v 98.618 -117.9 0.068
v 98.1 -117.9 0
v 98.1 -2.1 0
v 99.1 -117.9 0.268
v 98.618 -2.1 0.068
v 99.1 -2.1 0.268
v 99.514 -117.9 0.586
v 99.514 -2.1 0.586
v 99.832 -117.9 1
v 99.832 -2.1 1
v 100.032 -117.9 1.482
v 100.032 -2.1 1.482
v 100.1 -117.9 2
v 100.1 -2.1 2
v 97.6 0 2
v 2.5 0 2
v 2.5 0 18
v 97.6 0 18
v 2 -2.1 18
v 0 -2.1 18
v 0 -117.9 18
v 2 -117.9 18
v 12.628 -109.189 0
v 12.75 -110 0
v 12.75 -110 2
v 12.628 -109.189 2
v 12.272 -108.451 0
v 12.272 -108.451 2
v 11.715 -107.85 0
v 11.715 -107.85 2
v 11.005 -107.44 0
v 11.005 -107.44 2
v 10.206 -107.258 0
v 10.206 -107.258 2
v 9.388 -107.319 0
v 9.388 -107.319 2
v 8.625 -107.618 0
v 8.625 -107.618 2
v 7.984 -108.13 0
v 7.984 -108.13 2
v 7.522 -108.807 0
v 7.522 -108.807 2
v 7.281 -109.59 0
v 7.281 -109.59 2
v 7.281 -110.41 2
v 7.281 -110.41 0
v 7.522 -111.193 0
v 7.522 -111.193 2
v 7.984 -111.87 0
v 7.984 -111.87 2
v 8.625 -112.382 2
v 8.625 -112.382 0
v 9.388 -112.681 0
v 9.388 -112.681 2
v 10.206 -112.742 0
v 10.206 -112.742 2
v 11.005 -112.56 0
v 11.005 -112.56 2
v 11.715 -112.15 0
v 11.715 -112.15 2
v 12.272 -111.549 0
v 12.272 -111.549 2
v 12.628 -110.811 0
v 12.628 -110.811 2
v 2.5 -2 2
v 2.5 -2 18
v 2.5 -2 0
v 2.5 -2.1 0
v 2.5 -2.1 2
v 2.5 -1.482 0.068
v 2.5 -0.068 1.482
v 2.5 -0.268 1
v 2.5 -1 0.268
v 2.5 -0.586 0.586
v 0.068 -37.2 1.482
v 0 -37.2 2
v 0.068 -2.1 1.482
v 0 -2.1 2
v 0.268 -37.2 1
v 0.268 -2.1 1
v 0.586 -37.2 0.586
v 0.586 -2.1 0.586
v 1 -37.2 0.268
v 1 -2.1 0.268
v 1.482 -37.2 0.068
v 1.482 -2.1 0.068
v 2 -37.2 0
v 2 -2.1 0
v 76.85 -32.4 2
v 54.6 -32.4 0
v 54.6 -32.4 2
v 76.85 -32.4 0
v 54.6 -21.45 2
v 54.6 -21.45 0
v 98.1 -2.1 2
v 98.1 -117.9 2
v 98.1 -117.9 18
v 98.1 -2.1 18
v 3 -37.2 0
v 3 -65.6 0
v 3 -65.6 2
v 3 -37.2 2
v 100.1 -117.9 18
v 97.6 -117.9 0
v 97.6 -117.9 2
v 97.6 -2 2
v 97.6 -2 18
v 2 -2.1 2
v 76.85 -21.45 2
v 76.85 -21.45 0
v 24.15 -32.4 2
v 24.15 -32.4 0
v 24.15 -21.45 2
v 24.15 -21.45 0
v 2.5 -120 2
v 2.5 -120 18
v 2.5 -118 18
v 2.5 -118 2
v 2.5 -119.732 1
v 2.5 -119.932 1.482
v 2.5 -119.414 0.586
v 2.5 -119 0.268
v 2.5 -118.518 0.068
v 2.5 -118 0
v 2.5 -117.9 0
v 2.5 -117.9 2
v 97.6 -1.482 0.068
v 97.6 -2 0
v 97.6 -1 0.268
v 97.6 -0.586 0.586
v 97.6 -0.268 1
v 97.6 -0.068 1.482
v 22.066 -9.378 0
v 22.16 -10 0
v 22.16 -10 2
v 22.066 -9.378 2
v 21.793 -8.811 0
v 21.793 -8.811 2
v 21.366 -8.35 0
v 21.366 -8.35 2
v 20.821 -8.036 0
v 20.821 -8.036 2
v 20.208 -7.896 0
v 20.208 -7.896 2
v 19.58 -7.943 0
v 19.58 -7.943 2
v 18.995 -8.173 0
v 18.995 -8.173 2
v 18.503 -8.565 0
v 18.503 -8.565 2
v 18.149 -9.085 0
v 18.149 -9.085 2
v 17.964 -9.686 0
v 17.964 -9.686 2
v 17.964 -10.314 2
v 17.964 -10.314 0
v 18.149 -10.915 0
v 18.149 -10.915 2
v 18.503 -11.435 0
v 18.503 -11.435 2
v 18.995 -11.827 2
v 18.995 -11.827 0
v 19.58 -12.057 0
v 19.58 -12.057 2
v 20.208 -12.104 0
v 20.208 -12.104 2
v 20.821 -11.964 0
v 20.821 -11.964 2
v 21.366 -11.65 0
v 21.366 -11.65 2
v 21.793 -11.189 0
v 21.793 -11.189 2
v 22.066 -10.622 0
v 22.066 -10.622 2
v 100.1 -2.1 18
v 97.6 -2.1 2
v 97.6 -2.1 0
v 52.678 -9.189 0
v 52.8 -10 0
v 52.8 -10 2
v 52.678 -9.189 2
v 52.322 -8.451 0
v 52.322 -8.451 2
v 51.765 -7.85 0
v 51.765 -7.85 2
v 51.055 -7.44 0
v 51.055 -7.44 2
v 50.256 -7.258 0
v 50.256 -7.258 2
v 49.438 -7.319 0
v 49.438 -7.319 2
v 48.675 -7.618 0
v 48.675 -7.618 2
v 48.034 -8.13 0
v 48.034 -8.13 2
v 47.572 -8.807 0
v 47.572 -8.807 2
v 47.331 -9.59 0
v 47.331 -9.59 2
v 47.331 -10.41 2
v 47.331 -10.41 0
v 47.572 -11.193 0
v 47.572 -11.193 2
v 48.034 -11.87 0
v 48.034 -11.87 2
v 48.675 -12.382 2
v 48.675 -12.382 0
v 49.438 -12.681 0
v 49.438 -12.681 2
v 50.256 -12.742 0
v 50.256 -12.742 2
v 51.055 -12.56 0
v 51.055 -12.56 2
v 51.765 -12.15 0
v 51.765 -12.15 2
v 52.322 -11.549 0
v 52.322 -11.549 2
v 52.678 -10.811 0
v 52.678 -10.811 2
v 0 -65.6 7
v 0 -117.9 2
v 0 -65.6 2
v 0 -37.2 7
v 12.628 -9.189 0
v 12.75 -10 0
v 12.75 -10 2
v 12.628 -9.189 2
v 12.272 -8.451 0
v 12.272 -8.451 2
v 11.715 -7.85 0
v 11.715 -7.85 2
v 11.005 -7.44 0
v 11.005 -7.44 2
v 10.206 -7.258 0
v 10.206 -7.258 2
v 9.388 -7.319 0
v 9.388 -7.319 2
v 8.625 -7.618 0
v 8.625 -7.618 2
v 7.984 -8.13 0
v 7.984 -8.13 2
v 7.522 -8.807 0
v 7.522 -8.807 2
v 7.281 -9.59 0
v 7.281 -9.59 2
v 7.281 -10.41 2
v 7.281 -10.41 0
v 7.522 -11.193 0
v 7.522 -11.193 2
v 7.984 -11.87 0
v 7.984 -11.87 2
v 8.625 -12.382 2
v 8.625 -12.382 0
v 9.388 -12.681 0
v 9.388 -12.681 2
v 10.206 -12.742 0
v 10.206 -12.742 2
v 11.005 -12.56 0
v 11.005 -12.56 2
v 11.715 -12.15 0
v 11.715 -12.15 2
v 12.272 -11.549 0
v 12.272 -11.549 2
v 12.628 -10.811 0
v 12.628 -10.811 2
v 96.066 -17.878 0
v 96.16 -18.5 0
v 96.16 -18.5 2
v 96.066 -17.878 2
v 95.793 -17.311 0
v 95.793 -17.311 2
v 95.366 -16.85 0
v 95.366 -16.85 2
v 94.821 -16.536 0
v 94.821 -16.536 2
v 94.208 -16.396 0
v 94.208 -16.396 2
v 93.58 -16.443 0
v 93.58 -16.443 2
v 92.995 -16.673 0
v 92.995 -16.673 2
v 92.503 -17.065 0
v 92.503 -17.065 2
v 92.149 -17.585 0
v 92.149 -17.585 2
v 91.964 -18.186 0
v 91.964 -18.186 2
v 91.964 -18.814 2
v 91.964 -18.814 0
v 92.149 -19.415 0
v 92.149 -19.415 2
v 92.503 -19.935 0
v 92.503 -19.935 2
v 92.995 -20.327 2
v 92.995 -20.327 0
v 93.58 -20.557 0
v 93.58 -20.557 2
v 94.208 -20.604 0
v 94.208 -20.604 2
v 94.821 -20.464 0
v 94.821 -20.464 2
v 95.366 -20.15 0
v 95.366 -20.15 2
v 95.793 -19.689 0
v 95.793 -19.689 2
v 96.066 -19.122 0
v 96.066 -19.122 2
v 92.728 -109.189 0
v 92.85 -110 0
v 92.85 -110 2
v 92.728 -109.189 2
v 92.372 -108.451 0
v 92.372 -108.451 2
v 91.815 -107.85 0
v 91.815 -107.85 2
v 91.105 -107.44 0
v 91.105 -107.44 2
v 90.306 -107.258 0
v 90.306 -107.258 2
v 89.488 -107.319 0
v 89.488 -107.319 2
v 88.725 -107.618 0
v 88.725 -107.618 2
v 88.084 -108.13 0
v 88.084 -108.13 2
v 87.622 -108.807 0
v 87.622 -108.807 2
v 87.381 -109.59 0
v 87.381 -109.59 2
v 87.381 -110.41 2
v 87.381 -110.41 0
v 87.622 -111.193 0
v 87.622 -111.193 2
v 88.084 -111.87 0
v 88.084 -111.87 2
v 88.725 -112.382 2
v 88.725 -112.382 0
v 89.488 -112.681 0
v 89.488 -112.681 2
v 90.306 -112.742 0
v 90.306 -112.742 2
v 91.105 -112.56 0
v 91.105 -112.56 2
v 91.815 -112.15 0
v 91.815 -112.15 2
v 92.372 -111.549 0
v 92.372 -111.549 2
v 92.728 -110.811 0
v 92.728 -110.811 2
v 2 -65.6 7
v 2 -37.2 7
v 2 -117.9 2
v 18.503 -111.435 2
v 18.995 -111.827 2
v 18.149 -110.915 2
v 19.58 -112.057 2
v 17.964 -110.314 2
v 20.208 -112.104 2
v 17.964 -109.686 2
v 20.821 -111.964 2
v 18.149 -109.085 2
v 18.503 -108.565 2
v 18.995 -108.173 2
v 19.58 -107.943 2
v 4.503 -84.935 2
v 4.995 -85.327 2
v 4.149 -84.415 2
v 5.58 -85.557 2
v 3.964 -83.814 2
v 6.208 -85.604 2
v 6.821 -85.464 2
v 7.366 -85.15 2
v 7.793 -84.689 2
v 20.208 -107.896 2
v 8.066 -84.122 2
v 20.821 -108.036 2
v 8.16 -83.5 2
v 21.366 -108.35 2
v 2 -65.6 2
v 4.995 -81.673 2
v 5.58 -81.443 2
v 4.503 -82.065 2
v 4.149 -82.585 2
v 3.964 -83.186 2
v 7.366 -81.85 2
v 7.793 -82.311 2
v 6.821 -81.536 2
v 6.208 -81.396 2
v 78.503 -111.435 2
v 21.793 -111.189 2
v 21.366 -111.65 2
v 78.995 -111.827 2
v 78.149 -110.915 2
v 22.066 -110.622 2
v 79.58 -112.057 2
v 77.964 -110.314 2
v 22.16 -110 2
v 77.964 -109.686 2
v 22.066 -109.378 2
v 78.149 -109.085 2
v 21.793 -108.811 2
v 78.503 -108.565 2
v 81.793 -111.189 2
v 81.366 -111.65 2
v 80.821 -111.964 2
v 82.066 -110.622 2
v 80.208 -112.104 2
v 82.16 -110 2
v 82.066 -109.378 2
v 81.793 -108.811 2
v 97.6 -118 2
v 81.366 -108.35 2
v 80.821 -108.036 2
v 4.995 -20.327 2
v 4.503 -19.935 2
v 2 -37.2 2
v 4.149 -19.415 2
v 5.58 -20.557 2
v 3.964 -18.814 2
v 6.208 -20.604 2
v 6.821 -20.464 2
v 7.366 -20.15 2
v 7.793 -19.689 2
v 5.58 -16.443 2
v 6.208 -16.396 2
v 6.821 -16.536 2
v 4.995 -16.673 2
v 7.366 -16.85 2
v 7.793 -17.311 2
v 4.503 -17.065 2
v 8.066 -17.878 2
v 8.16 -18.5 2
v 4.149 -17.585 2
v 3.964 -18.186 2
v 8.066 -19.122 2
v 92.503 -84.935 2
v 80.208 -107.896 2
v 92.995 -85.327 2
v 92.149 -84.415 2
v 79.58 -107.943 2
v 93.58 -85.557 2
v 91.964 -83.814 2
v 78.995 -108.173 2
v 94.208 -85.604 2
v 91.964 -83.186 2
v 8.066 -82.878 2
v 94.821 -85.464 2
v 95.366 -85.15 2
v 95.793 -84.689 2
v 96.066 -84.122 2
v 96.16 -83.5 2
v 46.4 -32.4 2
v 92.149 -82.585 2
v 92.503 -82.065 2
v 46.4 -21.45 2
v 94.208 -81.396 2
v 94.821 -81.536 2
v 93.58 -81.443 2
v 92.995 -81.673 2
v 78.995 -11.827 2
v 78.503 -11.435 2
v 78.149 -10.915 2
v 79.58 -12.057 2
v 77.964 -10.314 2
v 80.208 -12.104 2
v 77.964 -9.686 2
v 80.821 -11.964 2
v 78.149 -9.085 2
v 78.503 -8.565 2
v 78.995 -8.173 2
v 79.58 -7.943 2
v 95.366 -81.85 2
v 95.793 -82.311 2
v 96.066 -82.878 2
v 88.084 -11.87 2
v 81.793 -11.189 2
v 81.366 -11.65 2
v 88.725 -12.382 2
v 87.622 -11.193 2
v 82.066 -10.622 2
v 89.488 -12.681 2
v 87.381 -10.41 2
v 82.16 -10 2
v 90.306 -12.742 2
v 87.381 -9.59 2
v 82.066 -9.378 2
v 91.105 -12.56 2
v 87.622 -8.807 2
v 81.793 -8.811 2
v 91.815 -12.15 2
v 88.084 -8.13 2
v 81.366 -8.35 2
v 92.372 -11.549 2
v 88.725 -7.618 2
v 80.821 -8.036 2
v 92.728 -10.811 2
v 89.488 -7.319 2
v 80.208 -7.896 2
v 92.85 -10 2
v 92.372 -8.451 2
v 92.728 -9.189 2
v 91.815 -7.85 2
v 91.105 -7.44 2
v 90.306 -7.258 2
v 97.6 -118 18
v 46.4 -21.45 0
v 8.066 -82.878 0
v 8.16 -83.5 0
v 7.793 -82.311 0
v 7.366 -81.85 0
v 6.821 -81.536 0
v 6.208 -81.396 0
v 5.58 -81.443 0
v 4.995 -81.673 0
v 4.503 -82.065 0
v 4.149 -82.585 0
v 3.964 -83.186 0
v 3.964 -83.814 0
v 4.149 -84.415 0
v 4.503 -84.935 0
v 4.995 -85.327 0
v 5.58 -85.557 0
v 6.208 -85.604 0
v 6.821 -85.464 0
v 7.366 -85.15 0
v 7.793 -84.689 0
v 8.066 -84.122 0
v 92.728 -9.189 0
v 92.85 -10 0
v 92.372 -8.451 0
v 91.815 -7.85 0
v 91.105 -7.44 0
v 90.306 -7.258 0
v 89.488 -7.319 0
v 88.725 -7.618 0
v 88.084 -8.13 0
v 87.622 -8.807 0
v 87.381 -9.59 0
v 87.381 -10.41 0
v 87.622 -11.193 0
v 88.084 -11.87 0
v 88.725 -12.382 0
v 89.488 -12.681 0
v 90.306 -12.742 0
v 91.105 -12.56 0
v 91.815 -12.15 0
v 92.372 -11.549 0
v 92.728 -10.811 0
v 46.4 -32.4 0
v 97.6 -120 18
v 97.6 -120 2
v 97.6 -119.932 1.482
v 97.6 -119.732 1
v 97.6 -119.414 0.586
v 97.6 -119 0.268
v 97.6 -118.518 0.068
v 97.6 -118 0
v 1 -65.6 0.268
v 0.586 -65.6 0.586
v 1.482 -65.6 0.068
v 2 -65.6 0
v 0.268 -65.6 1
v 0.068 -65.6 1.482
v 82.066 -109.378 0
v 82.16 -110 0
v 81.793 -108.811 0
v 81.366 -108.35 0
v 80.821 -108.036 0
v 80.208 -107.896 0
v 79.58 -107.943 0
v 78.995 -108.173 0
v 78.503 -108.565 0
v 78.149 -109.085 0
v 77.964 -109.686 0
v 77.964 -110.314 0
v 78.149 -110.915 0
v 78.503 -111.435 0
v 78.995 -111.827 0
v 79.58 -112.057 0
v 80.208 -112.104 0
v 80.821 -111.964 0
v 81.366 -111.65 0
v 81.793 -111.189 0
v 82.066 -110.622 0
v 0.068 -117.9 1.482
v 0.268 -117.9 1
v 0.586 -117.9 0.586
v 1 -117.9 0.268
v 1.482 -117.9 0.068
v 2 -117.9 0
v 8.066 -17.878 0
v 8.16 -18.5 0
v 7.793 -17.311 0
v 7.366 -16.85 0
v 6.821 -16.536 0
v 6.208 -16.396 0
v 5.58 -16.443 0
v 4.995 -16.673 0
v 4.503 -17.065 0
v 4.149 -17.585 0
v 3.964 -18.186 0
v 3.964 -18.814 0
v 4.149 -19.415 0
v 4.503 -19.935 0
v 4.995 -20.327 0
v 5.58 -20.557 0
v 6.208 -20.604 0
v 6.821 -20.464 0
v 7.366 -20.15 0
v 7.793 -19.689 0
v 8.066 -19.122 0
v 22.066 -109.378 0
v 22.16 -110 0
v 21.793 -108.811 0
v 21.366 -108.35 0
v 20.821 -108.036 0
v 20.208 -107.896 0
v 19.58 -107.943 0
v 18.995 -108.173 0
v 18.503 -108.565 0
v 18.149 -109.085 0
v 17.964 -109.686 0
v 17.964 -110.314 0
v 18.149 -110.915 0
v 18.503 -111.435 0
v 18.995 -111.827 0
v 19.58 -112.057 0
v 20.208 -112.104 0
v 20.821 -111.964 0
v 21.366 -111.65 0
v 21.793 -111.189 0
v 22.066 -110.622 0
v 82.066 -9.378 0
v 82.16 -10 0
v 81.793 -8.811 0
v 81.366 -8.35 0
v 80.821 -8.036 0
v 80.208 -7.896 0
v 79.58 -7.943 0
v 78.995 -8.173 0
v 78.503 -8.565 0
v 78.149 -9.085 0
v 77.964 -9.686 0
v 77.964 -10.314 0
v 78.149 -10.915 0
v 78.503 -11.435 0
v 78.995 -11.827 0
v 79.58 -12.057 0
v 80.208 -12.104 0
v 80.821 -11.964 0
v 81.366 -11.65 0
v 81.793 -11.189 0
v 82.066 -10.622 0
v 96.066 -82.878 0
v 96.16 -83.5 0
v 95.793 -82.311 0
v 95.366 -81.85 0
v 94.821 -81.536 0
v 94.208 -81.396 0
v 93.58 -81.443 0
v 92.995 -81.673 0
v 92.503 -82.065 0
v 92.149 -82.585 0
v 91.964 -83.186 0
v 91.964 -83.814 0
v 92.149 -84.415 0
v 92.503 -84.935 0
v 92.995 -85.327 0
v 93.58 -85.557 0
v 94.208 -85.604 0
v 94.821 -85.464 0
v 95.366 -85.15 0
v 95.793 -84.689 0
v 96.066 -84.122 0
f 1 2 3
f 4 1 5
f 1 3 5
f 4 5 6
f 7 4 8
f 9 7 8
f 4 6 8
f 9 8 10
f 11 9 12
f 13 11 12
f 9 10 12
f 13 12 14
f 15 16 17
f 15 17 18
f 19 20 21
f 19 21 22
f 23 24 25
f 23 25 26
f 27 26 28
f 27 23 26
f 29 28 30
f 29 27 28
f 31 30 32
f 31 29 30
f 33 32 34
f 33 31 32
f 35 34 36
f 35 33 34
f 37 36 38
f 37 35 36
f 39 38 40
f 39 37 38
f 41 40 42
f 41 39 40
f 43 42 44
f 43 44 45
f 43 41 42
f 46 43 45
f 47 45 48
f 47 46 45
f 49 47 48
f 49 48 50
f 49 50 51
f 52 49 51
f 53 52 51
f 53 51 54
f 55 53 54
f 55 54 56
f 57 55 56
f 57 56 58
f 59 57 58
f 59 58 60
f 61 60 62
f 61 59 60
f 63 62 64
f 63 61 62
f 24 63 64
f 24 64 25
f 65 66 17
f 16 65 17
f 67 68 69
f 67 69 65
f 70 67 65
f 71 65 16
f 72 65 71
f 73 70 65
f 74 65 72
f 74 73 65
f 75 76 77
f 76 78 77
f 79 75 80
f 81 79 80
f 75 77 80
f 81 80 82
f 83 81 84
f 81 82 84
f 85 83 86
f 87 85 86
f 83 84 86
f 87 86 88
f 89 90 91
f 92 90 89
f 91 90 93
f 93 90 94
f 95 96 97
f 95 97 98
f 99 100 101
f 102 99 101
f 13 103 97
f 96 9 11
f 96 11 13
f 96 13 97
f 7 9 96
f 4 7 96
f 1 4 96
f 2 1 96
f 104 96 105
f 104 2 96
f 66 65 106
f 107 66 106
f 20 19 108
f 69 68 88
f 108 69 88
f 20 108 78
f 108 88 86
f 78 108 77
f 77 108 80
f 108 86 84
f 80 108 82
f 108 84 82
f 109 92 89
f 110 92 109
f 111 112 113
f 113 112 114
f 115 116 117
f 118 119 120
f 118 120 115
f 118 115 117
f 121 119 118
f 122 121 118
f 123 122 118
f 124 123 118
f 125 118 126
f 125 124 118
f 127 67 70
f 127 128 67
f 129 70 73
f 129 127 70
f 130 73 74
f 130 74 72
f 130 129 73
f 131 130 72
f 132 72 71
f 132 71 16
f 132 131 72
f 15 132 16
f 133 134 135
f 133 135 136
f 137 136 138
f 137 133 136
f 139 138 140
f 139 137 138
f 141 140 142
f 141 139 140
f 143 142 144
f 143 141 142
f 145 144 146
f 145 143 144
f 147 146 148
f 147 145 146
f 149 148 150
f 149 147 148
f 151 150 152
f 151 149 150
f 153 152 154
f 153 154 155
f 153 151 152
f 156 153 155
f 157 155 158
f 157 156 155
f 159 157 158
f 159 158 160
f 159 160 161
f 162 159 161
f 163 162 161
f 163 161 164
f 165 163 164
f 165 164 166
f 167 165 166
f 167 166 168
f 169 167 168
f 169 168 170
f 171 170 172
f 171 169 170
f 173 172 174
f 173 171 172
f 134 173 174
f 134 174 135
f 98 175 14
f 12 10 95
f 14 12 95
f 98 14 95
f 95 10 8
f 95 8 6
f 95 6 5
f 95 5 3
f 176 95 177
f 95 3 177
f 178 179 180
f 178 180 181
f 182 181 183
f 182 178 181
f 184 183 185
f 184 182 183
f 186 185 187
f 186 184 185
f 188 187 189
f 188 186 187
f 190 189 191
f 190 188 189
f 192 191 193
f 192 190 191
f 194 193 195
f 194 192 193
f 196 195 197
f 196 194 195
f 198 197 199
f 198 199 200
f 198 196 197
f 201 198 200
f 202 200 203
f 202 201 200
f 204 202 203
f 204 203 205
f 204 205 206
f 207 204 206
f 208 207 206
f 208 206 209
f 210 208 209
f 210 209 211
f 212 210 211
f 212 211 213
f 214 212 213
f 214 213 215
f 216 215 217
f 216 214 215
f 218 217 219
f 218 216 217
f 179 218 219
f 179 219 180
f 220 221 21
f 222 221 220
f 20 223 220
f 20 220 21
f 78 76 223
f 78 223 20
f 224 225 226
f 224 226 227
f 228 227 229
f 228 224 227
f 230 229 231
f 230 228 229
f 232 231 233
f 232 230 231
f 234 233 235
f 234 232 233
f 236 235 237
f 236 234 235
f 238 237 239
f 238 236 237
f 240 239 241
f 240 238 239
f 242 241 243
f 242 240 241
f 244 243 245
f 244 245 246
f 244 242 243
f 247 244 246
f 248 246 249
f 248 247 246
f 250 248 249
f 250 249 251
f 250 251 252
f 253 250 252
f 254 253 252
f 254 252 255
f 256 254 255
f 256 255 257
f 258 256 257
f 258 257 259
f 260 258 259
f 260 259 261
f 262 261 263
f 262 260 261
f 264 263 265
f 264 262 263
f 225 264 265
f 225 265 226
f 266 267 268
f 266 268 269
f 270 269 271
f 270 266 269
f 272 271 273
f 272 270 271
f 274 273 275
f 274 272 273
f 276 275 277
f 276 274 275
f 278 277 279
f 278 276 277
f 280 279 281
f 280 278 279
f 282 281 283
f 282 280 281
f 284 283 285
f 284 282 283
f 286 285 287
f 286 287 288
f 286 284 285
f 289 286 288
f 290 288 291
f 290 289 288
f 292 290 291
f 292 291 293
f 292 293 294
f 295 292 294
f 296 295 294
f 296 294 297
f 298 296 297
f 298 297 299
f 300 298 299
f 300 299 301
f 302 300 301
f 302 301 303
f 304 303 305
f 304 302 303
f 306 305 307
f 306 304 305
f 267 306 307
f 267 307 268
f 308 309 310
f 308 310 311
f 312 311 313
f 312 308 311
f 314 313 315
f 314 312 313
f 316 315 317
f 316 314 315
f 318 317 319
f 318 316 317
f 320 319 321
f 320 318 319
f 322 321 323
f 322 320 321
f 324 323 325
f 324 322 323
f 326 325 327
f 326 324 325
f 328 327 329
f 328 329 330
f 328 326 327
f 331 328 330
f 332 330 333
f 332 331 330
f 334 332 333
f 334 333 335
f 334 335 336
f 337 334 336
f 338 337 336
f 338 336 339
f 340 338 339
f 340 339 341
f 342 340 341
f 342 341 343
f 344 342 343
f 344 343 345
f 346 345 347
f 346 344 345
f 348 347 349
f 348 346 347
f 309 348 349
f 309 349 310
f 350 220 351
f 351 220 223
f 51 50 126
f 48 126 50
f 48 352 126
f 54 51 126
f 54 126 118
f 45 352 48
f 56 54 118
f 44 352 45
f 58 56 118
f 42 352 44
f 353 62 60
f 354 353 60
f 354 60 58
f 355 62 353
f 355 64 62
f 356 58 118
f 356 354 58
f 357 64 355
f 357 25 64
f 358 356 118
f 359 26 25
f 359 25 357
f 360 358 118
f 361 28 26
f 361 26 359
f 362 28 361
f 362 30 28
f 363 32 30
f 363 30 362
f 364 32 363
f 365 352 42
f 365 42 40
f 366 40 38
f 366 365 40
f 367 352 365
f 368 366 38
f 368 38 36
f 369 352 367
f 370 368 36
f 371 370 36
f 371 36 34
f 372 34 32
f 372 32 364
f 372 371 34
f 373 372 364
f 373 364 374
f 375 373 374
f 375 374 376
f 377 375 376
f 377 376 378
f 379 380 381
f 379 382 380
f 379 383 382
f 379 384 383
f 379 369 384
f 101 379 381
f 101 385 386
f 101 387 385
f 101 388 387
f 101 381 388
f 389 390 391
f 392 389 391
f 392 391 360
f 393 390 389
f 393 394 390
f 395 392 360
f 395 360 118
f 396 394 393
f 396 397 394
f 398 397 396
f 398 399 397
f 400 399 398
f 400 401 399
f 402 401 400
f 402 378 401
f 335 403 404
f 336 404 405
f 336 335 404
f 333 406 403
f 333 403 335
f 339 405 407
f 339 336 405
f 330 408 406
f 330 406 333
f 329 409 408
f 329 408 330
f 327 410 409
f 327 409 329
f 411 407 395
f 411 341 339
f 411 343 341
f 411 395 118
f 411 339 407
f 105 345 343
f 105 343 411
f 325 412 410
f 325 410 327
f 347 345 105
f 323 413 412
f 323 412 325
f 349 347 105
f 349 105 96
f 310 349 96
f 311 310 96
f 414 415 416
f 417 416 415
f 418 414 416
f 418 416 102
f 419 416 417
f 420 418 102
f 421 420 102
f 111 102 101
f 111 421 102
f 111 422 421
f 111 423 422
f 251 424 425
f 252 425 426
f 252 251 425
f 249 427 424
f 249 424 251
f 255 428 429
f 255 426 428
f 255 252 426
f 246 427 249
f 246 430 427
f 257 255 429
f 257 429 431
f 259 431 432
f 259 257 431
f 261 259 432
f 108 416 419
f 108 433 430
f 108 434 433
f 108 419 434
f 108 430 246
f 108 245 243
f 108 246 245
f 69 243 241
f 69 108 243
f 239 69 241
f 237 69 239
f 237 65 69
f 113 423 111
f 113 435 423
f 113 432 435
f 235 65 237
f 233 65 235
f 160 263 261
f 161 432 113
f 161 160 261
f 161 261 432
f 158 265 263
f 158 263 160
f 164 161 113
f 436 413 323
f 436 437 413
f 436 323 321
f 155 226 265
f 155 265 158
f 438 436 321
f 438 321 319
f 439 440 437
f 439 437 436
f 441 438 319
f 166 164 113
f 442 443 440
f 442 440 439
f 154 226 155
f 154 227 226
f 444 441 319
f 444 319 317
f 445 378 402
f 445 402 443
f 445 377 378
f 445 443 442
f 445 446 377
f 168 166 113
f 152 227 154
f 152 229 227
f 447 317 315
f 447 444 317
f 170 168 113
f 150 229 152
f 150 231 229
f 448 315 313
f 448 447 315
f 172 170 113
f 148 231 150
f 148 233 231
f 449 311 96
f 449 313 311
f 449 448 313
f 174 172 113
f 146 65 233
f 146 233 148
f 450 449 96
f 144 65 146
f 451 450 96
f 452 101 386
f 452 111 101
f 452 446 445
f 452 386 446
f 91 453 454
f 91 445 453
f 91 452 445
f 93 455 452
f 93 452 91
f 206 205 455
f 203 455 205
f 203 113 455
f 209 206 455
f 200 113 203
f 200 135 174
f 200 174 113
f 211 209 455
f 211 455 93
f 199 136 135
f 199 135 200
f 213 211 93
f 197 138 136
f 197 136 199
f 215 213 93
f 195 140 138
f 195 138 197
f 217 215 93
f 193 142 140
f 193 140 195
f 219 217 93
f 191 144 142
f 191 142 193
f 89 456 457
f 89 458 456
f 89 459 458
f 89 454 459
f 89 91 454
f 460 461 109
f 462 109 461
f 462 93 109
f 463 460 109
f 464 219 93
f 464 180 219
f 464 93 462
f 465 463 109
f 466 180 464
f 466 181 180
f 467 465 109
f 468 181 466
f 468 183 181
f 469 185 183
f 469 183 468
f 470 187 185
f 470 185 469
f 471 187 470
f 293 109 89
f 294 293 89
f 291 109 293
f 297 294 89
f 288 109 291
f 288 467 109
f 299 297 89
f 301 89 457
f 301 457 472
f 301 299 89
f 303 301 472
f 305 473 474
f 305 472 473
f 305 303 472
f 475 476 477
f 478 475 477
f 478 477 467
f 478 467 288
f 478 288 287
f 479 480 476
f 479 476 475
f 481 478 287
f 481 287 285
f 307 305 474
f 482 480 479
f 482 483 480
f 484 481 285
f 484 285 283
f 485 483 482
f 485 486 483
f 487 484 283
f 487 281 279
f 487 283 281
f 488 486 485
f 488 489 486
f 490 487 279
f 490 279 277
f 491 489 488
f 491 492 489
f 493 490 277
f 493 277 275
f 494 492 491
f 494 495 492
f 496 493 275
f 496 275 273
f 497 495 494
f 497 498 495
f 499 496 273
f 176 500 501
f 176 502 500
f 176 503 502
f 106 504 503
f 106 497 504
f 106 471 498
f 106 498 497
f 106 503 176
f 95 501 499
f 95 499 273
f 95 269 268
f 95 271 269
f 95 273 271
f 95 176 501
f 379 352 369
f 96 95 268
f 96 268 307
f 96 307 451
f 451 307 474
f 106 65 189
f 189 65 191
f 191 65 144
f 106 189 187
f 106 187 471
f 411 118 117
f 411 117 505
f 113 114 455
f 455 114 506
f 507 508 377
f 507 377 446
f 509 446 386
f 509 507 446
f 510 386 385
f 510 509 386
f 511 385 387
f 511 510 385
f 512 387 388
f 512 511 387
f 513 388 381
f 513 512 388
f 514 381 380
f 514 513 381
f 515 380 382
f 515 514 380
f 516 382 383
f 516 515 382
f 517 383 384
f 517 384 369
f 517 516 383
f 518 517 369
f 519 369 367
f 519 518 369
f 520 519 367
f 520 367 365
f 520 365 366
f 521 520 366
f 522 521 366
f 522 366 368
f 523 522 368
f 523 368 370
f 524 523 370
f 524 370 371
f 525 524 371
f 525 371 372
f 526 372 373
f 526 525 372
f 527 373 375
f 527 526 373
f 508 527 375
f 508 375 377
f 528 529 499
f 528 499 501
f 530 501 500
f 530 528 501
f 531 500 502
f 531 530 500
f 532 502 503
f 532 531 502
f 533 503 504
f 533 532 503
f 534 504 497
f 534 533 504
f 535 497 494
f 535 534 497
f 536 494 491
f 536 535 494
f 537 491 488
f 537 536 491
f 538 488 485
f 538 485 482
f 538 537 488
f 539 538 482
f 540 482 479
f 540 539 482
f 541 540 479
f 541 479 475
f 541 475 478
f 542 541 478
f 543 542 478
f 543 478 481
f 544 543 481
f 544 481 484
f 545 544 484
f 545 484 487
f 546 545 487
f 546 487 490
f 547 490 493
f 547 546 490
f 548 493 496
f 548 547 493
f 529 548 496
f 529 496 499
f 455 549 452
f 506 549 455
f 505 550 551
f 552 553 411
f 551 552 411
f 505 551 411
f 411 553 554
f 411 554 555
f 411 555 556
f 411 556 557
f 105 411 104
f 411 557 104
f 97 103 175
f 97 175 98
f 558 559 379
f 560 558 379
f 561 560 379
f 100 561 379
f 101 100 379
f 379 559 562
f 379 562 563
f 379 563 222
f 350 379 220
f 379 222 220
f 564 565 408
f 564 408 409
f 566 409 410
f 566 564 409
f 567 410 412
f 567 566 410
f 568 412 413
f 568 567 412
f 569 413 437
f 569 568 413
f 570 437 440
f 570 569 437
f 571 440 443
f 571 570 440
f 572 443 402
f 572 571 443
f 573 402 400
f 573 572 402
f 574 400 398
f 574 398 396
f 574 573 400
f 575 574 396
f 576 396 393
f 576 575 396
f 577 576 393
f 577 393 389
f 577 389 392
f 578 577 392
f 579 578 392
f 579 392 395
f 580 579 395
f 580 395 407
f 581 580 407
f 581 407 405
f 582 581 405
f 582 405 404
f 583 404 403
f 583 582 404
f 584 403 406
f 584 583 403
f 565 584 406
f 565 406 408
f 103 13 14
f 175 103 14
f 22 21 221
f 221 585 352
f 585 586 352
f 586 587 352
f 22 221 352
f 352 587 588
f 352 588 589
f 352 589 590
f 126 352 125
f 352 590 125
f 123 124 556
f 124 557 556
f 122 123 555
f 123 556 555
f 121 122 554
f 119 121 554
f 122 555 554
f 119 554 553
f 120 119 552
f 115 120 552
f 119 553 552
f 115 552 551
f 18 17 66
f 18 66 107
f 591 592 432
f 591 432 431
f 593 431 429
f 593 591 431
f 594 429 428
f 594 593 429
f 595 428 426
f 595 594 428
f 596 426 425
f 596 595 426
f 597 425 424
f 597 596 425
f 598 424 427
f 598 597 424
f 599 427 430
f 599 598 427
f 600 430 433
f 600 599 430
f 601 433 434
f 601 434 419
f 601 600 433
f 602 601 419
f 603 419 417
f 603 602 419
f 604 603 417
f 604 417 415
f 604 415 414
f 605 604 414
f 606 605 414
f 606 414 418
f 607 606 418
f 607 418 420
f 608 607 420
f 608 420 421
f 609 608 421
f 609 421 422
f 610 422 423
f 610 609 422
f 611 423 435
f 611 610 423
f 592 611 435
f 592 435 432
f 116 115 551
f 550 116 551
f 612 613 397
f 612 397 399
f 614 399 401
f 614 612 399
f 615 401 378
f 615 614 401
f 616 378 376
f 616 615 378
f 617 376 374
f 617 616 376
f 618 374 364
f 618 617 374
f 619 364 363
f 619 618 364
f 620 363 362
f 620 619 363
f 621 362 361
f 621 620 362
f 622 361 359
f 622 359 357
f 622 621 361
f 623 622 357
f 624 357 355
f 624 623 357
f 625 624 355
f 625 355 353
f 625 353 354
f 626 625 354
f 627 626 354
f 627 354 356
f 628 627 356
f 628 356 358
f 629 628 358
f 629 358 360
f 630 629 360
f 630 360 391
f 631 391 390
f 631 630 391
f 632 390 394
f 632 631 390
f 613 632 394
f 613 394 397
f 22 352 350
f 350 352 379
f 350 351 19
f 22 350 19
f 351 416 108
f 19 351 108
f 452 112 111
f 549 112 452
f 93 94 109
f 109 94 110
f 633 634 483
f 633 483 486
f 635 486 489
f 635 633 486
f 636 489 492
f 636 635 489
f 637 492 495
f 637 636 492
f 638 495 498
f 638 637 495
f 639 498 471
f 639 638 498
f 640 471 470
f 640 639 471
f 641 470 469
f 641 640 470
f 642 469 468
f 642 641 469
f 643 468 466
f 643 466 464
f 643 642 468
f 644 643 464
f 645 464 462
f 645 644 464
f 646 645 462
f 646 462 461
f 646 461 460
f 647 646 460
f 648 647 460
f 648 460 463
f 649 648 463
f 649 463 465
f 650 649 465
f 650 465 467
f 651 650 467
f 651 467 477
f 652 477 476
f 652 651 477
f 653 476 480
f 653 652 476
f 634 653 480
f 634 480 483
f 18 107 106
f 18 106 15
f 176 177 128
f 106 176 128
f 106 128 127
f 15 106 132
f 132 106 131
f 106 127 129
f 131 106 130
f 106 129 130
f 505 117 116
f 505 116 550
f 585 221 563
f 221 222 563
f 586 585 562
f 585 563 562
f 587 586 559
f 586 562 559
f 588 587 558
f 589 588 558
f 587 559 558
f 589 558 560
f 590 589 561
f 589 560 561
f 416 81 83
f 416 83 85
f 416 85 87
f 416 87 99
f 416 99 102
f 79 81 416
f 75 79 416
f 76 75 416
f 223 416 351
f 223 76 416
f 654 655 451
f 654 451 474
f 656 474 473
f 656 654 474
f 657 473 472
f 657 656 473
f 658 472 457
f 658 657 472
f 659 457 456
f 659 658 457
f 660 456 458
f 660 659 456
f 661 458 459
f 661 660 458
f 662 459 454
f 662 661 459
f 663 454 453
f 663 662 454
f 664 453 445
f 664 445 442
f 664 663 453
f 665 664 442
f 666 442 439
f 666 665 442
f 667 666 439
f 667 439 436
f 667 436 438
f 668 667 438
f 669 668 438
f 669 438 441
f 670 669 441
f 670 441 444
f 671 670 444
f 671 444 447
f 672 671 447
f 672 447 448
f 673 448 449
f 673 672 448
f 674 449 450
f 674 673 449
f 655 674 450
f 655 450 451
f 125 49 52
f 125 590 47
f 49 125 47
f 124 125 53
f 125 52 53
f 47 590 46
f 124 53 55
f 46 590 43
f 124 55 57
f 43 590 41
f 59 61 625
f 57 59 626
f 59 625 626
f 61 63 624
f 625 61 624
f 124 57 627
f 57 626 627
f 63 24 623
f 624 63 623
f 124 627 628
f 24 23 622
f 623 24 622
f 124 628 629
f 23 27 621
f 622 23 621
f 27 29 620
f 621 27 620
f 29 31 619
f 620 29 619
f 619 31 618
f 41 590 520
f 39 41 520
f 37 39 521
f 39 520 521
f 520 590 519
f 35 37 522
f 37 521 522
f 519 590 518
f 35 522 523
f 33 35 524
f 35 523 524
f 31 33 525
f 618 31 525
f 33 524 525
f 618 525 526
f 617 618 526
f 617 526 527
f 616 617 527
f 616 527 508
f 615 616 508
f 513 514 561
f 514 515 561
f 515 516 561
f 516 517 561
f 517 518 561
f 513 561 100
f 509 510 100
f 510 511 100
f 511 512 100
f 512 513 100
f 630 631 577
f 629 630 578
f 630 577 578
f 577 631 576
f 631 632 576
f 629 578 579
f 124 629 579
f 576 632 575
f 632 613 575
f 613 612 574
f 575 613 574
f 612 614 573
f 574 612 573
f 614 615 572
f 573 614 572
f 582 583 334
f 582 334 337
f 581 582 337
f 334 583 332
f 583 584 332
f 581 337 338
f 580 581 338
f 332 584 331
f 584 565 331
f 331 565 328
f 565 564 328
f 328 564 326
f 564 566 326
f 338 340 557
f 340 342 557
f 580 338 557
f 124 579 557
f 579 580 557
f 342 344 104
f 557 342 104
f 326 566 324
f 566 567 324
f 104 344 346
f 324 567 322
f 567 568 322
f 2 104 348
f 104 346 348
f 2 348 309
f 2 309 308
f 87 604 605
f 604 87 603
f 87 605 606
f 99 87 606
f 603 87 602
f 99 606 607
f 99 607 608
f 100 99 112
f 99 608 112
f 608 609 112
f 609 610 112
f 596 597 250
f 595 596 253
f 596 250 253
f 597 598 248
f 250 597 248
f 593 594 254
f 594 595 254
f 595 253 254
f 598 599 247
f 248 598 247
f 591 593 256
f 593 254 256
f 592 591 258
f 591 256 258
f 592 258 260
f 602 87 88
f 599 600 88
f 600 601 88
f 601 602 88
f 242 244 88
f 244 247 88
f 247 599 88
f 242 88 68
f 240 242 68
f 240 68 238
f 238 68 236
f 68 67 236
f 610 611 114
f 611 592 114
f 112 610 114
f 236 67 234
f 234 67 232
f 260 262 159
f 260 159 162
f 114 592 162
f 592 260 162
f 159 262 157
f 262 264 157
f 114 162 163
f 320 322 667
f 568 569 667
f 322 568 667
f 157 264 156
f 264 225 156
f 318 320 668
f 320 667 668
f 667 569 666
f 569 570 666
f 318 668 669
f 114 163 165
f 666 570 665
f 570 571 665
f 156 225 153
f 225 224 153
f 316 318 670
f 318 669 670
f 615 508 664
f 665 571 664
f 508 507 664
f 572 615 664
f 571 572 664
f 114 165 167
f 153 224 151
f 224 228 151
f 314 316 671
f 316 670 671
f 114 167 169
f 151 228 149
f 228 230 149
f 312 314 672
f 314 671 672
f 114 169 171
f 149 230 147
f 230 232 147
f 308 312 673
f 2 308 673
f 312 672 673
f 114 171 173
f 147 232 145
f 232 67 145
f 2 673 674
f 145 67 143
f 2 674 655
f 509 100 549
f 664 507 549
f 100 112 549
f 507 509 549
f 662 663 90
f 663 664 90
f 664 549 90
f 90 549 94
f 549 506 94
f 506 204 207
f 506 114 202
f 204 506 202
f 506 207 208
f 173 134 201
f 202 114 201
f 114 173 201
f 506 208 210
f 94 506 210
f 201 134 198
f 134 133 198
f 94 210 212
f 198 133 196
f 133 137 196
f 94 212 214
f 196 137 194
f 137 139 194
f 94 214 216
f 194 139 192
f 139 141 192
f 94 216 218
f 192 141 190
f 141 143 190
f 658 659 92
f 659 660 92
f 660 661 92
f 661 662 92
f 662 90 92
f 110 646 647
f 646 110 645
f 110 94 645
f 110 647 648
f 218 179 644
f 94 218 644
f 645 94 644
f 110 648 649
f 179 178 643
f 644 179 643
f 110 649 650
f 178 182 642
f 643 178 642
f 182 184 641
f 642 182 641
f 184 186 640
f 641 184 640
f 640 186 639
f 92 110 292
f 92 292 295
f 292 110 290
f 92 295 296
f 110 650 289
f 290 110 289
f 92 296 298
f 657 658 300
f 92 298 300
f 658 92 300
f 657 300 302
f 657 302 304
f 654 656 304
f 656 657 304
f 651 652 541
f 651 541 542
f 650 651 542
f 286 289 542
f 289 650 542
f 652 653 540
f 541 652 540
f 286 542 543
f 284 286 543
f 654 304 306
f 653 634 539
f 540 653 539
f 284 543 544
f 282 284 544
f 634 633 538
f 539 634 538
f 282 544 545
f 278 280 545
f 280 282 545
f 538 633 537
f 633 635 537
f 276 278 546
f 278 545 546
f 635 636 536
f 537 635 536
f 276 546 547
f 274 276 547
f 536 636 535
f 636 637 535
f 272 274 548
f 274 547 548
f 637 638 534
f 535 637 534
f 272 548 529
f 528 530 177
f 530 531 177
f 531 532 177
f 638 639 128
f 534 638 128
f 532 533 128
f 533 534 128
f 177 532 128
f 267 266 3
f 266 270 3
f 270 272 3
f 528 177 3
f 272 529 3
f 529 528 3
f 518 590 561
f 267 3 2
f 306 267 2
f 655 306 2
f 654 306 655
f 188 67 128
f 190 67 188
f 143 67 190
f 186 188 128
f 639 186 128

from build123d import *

# Parameters (mm, degrees)
SKETCH1_W           = 100.1
SKETCH1_H           = 120
SKETCH1_R           = 2.75
SKETCH1_R_2         = 2.11
SKETCH1_W_2         = 22.25
SKETCH1_H_2         = 10.95
BOSS_EXTRUDE1_DEPTH = 2
SKETCH2_W           = 2
SKETCH2_H           = 115.8
BOSS_EXTRUDE2_DEPTH = 16
SKETCH4_W           = 95.1
SKETCH4_H           = 2
BOSS_EXTRUDE3_DEPTH = 16
SKETCH5_W           = 2.5
SKETCH5_H           = 2.1
CUT_EXTRUDE1_DEPTH  = 2
SKETCH6_W           = 7
SKETCH6_H           = 28.4
CUT_EXTRUDE2_DEPTH  = 3
FILLET2_R           = 2


with BuildPart() as part:
    # Sketch1 → Boss-Extrude1 (new body)
    with BuildSketch(Plane.XY):
        with Locations((50.05, -60)):
            Rectangle(SKETCH1_W, SKETCH1_H)
        with Locations((10, -10)):
            Circle(SKETCH1_R, mode=Mode.SUBTRACT)
        with Locations((90.1, -10)):
            Circle(SKETCH1_R, mode=Mode.SUBTRACT)
        with Locations((10, -110)):
            Circle(SKETCH1_R, mode=Mode.SUBTRACT)
        with Locations((6.05, -18.5)):
            Circle(SKETCH1_R_2, mode=Mode.SUBTRACT)
        with Locations((6.05, -83.5)):
            Circle(SKETCH1_R_2, mode=Mode.SUBTRACT)
        with Locations((94.05, -18.5)):
            Circle(SKETCH1_R_2, mode=Mode.SUBTRACT)
        with Locations((94.05, -83.5)):
            Circle(SKETCH1_R_2, mode=Mode.SUBTRACT)
        with Locations((20.05, -10)):
            Circle(SKETCH1_R_2, mode=Mode.SUBTRACT)
        with Locations((80.05, -10)):
            Circle(SKETCH1_R_2, mode=Mode.SUBTRACT)
        with Locations((20.05, -110)):
            Circle(SKETCH1_R_2, mode=Mode.SUBTRACT)
        with Locations((80.05, -110)):
            Circle(SKETCH1_R_2, mode=Mode.SUBTRACT)
        with Locations((90.1, -110)):
            Circle(SKETCH1_R, mode=Mode.SUBTRACT)
        with Locations((50.05, -10)):
            Circle(SKETCH1_R, mode=Mode.SUBTRACT)
        with Locations((35.275, -26.925)):
            Rectangle(SKETCH1_W_2, SKETCH1_H_2, mode=Mode.SUBTRACT)
        with Locations((65.725, -26.925)):
            Rectangle(SKETCH1_W_2, SKETCH1_H_2, mode=Mode.SUBTRACT)
    extrude(amount=BOSS_EXTRUDE1_DEPTH)

    # Sketch2 → Boss-Extrude2 (add)
    with BuildSketch(Plane.XY.offset(2)):
        with Locations((1, -60)):
            Rectangle(SKETCH2_W, SKETCH2_H)
    boss_extrude2 = extrude(amount=BOSS_EXTRUDE2_DEPTH)

    # Mirror1: Boss-Extrude2 across plane
    add(boss_extrude2.mirror(Plane(origin=(50.05, 0, 0), x_dir=(0, 0, 1), z_dir=(1, 0, 0))))

    # Sketch4 → Boss-Extrude3 (add)
    with BuildSketch(Plane.XY.offset(2)):
        with Locations((50.05, -1)):
            Rectangle(SKETCH4_W, SKETCH4_H)
        with Locations((50.05, -119)):
            Rectangle(SKETCH4_W, SKETCH4_H)
    extrude(amount=BOSS_EXTRUDE3_DEPTH)

    # Sketch5 → Cut-Extrude1 (cut)
    with BuildSketch(Plane(origin=(0, 0, 0), x_dir=(-1, 0, 0), z_dir=(0, 0, -1))):
        with Locations((-1.25, -1.05)):
            Rectangle(SKETCH5_W, SKETCH5_H)
        with Locations((-98.85, -118.95)):
            Rectangle(SKETCH5_W, SKETCH5_H)
        with Locations((-1.25, -118.95)):
            Rectangle(SKETCH5_W, SKETCH5_H)
        with Locations((-98.85, -1.05)):
            Rectangle(SKETCH5_W, SKETCH5_H)
    extrude(amount=-CUT_EXTRUDE1_DEPTH, mode=Mode.SUBTRACT)

    # Sketch6 → Cut-Extrude2 (cut)
    with BuildSketch(Plane.ZY):
        with Locations((3.5, -51.4)):
            Rectangle(SKETCH6_W, SKETCH6_H)
    extrude(amount=-CUT_EXTRUDE2_DEPTH, mode=Mode.SUBTRACT)

    # Fillet2
    fillet2_edges = [part.edges().sort_by_distance(p)[0] for p in [
        (0, -19.65, 0),
        (100.1, -60, 0),
        (50.05, -120, 0),
        (50.05, 0, 0),
        (0, -91.75, 0),
    ]]
    fillet(fillet2_edges, radius=FILLET2_R)


solid = part.part
